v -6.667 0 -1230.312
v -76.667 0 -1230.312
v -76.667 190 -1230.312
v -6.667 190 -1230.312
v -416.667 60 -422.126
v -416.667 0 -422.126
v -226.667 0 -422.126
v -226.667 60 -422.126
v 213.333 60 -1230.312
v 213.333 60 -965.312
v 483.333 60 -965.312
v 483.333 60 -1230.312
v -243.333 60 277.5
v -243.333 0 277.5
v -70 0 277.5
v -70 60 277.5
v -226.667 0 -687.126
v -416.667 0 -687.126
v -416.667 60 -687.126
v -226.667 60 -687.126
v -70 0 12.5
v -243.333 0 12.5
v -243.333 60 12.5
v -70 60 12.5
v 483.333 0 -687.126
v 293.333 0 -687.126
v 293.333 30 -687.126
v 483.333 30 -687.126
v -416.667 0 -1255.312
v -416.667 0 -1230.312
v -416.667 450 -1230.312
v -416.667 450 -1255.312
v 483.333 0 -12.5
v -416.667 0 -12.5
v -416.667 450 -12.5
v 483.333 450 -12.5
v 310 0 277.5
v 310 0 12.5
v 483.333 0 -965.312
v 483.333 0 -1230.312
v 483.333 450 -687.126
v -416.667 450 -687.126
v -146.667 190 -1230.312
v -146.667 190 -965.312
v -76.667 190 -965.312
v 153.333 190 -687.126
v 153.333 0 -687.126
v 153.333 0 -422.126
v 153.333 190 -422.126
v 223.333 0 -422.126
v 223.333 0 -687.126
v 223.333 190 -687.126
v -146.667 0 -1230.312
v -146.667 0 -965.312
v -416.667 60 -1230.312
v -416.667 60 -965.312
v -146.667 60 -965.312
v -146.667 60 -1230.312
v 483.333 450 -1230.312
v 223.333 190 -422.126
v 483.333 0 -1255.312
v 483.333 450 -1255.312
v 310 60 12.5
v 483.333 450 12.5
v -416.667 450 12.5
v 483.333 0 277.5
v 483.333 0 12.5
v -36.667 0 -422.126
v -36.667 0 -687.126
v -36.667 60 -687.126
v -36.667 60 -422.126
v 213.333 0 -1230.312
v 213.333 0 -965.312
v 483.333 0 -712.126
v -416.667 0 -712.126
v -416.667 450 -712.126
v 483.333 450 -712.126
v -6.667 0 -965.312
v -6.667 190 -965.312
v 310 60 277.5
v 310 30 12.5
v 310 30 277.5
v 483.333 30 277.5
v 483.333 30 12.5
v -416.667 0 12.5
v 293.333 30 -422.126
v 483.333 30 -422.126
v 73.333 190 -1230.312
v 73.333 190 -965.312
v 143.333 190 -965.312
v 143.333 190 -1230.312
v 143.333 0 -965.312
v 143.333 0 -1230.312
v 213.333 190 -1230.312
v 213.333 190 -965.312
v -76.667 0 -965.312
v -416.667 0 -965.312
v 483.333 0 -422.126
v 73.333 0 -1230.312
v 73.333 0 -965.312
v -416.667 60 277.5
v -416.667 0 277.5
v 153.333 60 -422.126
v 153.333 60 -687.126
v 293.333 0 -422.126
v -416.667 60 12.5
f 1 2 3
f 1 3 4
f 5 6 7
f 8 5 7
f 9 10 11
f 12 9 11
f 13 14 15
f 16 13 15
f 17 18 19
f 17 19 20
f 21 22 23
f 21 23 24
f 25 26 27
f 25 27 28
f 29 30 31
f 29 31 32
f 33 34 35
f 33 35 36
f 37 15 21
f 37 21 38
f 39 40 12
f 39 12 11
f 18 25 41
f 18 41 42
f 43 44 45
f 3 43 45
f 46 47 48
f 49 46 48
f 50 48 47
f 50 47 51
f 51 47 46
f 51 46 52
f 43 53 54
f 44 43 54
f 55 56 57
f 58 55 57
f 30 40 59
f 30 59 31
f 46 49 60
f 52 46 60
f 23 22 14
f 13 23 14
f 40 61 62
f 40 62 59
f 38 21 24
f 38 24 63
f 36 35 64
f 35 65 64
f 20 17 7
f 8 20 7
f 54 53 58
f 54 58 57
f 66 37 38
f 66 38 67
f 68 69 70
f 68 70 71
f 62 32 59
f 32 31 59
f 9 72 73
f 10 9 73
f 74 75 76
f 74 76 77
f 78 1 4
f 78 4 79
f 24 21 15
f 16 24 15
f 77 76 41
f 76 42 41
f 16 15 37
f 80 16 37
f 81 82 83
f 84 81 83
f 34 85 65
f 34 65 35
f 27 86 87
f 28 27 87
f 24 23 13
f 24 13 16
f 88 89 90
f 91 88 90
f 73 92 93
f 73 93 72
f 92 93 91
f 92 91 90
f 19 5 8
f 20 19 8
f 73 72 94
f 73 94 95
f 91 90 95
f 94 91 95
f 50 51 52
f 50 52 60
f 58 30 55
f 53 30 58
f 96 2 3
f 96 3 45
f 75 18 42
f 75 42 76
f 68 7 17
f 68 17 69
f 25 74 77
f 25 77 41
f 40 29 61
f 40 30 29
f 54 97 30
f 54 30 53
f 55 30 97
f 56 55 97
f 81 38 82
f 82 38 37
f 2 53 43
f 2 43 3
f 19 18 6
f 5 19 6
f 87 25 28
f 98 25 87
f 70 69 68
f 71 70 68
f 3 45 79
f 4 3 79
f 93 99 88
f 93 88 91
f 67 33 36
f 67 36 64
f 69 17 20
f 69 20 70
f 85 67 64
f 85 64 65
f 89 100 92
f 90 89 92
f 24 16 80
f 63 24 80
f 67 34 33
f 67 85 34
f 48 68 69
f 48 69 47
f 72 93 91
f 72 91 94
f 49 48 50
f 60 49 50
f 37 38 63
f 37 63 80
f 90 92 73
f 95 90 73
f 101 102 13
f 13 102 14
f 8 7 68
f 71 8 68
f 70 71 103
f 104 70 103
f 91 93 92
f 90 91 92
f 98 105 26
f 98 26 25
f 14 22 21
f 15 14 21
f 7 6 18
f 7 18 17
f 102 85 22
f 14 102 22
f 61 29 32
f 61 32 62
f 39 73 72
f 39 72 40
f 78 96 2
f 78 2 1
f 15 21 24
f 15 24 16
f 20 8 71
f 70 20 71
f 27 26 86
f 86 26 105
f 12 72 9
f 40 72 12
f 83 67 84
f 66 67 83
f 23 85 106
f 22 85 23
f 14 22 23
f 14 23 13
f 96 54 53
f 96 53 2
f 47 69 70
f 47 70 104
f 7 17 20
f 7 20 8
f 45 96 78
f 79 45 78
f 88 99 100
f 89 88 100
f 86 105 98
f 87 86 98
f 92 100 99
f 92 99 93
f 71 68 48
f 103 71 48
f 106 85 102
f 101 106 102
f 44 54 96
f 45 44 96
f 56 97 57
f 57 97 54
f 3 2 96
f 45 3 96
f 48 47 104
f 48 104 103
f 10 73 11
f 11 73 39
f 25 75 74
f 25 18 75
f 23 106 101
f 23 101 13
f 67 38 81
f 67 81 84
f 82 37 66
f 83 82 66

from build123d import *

# Parameters (mm, degrees)
F1_DEPTH = 450
F0_W     = 173.333334
F0_H     = 265
F0_W_2   = 190
F0_W_3   = 270
F2_DEPTH = 60
F0_W_4   = 173.333333
F3_DEPTH = 60
F0_W_5   = 380
F4_DEPTH = 60
F5_DEPTH = 30
F6_DEPTH = 60
F0_W_6   = 70
F7_DEPTH = 190
F8_DEPTH = 190


with BuildPart() as f1:
    # F0 (on Front) → F1 (new body)
    with BuildSketch(Plane.XZ):
        Polygon((-416.666667, -12.5), (483.333333, -12.5), (483.333333, 12.5), (310, 12.5), (-70, 12.5), (-243.333333, 12.5), (-416.666667, 12.5), align=None)
        Polygon((-416.666657, -712.125778), (483.333343, -712.125778), (483.333343, -687.125778), (293.333343, -687.125778), (223.333343, -687.125778), (153.333343, -687.125778), (-36.666657, -687.125778), (-226.666657, -687.125778), (-416.666657, -687.125778), align=None)
        Polygon((-416.666657, -1255.312204), (483.333343, -1255.312204), (483.333343, -1230.312204), (213.333343, -1230.312204), (143.333343, -1230.312204), (73.333343, -1230.312204), (-6.666657, -1230.312204), (-76.666657, -1230.312204), (-146.666657, -1230.312204), (-416.666657, -1230.312204), align=None)
    extrude(amount=-F1_DEPTH)


with BuildPart() as f2:
    # F0 (on Front) → F2 (new body)
    with BuildSketch(Plane.XZ):
        with Locations((-330, 145)):
            Rectangle(F0_W, F0_H)
        with Locations((-321.666657, -554.625778)):
            Rectangle(F0_W_2, F0_H)
        with Locations((58.333343, -554.625778)):
            Rectangle(F0_W_2, F0_H)
        with Locations((-281.666657, -1097.812204)):
            Rectangle(F0_W_3, F0_H)
        with Locations((348.333343, -1097.812204)):
            Rectangle(F0_W_3, F0_H)
    extrude(amount=-F2_DEPTH)


with BuildPart() as f3:
    # F0 (on Front) → F3 (new body)
    with BuildSketch(Plane.XZ):
        with Locations((-156.666666, 145)):
            Rectangle(F0_W_4, F0_H)
    extrude(amount=-F3_DEPTH)


with BuildPart() as f4:
    # F0 (on Front) → F4 (new body)
    with BuildSketch(Plane.XZ):
        with Locations((120, 145)):
            Rectangle(F0_W_5, F0_H)
    extrude(amount=-F4_DEPTH)


with BuildPart() as f5:
    # F0 (on Front) → F5 (new body)
    with BuildSketch(Plane.XZ):
        with Locations((396.666667, 145)):
            Rectangle(F0_W_4, F0_H)
        with Locations((388.333343, -554.625778)):
            Rectangle(F0_W_2, F0_H)
    extrude(amount=-F5_DEPTH)


with BuildPart() as f6:
    # F0 (on Front) → F6 (new body)
    with BuildSketch(Plane.XZ):
        with Locations((-131.666657, -554.625778)):
            Rectangle(F0_W_2, F0_H)
    extrude(amount=-F6_DEPTH)


with BuildPart() as f7:
    # F0 (on Front) → F7 (new body)
    with BuildSketch(Plane.XZ):
        with Locations((188.333343, -554.625778)):
            Rectangle(F0_W_6, F0_H)
        with Locations((-111.666657, -1097.812204)):
            Rectangle(F0_W_6, F0_H)
        with Locations((178.333343, -1097.812204)):
            Rectangle(F0_W_6, F0_H)
    extrude(amount=-F7_DEPTH)


with BuildPart() as f8:
    # F0 (on Front) → F8 (new body)
    with BuildSketch(Plane.XZ):
        with Locations((-41.666657, -1097.812204)):
            Rectangle(F0_W_6, F0_H)
        with Locations((108.333343, -1097.812204)):
            Rectangle(F0_W_6, F0_H)
    extrude(amount=-F8_DEPTH)


solid = Compound([f1.part, f2.part, f3.part, f4.part, f5.part, f6.part, f7.part, f8.part])
